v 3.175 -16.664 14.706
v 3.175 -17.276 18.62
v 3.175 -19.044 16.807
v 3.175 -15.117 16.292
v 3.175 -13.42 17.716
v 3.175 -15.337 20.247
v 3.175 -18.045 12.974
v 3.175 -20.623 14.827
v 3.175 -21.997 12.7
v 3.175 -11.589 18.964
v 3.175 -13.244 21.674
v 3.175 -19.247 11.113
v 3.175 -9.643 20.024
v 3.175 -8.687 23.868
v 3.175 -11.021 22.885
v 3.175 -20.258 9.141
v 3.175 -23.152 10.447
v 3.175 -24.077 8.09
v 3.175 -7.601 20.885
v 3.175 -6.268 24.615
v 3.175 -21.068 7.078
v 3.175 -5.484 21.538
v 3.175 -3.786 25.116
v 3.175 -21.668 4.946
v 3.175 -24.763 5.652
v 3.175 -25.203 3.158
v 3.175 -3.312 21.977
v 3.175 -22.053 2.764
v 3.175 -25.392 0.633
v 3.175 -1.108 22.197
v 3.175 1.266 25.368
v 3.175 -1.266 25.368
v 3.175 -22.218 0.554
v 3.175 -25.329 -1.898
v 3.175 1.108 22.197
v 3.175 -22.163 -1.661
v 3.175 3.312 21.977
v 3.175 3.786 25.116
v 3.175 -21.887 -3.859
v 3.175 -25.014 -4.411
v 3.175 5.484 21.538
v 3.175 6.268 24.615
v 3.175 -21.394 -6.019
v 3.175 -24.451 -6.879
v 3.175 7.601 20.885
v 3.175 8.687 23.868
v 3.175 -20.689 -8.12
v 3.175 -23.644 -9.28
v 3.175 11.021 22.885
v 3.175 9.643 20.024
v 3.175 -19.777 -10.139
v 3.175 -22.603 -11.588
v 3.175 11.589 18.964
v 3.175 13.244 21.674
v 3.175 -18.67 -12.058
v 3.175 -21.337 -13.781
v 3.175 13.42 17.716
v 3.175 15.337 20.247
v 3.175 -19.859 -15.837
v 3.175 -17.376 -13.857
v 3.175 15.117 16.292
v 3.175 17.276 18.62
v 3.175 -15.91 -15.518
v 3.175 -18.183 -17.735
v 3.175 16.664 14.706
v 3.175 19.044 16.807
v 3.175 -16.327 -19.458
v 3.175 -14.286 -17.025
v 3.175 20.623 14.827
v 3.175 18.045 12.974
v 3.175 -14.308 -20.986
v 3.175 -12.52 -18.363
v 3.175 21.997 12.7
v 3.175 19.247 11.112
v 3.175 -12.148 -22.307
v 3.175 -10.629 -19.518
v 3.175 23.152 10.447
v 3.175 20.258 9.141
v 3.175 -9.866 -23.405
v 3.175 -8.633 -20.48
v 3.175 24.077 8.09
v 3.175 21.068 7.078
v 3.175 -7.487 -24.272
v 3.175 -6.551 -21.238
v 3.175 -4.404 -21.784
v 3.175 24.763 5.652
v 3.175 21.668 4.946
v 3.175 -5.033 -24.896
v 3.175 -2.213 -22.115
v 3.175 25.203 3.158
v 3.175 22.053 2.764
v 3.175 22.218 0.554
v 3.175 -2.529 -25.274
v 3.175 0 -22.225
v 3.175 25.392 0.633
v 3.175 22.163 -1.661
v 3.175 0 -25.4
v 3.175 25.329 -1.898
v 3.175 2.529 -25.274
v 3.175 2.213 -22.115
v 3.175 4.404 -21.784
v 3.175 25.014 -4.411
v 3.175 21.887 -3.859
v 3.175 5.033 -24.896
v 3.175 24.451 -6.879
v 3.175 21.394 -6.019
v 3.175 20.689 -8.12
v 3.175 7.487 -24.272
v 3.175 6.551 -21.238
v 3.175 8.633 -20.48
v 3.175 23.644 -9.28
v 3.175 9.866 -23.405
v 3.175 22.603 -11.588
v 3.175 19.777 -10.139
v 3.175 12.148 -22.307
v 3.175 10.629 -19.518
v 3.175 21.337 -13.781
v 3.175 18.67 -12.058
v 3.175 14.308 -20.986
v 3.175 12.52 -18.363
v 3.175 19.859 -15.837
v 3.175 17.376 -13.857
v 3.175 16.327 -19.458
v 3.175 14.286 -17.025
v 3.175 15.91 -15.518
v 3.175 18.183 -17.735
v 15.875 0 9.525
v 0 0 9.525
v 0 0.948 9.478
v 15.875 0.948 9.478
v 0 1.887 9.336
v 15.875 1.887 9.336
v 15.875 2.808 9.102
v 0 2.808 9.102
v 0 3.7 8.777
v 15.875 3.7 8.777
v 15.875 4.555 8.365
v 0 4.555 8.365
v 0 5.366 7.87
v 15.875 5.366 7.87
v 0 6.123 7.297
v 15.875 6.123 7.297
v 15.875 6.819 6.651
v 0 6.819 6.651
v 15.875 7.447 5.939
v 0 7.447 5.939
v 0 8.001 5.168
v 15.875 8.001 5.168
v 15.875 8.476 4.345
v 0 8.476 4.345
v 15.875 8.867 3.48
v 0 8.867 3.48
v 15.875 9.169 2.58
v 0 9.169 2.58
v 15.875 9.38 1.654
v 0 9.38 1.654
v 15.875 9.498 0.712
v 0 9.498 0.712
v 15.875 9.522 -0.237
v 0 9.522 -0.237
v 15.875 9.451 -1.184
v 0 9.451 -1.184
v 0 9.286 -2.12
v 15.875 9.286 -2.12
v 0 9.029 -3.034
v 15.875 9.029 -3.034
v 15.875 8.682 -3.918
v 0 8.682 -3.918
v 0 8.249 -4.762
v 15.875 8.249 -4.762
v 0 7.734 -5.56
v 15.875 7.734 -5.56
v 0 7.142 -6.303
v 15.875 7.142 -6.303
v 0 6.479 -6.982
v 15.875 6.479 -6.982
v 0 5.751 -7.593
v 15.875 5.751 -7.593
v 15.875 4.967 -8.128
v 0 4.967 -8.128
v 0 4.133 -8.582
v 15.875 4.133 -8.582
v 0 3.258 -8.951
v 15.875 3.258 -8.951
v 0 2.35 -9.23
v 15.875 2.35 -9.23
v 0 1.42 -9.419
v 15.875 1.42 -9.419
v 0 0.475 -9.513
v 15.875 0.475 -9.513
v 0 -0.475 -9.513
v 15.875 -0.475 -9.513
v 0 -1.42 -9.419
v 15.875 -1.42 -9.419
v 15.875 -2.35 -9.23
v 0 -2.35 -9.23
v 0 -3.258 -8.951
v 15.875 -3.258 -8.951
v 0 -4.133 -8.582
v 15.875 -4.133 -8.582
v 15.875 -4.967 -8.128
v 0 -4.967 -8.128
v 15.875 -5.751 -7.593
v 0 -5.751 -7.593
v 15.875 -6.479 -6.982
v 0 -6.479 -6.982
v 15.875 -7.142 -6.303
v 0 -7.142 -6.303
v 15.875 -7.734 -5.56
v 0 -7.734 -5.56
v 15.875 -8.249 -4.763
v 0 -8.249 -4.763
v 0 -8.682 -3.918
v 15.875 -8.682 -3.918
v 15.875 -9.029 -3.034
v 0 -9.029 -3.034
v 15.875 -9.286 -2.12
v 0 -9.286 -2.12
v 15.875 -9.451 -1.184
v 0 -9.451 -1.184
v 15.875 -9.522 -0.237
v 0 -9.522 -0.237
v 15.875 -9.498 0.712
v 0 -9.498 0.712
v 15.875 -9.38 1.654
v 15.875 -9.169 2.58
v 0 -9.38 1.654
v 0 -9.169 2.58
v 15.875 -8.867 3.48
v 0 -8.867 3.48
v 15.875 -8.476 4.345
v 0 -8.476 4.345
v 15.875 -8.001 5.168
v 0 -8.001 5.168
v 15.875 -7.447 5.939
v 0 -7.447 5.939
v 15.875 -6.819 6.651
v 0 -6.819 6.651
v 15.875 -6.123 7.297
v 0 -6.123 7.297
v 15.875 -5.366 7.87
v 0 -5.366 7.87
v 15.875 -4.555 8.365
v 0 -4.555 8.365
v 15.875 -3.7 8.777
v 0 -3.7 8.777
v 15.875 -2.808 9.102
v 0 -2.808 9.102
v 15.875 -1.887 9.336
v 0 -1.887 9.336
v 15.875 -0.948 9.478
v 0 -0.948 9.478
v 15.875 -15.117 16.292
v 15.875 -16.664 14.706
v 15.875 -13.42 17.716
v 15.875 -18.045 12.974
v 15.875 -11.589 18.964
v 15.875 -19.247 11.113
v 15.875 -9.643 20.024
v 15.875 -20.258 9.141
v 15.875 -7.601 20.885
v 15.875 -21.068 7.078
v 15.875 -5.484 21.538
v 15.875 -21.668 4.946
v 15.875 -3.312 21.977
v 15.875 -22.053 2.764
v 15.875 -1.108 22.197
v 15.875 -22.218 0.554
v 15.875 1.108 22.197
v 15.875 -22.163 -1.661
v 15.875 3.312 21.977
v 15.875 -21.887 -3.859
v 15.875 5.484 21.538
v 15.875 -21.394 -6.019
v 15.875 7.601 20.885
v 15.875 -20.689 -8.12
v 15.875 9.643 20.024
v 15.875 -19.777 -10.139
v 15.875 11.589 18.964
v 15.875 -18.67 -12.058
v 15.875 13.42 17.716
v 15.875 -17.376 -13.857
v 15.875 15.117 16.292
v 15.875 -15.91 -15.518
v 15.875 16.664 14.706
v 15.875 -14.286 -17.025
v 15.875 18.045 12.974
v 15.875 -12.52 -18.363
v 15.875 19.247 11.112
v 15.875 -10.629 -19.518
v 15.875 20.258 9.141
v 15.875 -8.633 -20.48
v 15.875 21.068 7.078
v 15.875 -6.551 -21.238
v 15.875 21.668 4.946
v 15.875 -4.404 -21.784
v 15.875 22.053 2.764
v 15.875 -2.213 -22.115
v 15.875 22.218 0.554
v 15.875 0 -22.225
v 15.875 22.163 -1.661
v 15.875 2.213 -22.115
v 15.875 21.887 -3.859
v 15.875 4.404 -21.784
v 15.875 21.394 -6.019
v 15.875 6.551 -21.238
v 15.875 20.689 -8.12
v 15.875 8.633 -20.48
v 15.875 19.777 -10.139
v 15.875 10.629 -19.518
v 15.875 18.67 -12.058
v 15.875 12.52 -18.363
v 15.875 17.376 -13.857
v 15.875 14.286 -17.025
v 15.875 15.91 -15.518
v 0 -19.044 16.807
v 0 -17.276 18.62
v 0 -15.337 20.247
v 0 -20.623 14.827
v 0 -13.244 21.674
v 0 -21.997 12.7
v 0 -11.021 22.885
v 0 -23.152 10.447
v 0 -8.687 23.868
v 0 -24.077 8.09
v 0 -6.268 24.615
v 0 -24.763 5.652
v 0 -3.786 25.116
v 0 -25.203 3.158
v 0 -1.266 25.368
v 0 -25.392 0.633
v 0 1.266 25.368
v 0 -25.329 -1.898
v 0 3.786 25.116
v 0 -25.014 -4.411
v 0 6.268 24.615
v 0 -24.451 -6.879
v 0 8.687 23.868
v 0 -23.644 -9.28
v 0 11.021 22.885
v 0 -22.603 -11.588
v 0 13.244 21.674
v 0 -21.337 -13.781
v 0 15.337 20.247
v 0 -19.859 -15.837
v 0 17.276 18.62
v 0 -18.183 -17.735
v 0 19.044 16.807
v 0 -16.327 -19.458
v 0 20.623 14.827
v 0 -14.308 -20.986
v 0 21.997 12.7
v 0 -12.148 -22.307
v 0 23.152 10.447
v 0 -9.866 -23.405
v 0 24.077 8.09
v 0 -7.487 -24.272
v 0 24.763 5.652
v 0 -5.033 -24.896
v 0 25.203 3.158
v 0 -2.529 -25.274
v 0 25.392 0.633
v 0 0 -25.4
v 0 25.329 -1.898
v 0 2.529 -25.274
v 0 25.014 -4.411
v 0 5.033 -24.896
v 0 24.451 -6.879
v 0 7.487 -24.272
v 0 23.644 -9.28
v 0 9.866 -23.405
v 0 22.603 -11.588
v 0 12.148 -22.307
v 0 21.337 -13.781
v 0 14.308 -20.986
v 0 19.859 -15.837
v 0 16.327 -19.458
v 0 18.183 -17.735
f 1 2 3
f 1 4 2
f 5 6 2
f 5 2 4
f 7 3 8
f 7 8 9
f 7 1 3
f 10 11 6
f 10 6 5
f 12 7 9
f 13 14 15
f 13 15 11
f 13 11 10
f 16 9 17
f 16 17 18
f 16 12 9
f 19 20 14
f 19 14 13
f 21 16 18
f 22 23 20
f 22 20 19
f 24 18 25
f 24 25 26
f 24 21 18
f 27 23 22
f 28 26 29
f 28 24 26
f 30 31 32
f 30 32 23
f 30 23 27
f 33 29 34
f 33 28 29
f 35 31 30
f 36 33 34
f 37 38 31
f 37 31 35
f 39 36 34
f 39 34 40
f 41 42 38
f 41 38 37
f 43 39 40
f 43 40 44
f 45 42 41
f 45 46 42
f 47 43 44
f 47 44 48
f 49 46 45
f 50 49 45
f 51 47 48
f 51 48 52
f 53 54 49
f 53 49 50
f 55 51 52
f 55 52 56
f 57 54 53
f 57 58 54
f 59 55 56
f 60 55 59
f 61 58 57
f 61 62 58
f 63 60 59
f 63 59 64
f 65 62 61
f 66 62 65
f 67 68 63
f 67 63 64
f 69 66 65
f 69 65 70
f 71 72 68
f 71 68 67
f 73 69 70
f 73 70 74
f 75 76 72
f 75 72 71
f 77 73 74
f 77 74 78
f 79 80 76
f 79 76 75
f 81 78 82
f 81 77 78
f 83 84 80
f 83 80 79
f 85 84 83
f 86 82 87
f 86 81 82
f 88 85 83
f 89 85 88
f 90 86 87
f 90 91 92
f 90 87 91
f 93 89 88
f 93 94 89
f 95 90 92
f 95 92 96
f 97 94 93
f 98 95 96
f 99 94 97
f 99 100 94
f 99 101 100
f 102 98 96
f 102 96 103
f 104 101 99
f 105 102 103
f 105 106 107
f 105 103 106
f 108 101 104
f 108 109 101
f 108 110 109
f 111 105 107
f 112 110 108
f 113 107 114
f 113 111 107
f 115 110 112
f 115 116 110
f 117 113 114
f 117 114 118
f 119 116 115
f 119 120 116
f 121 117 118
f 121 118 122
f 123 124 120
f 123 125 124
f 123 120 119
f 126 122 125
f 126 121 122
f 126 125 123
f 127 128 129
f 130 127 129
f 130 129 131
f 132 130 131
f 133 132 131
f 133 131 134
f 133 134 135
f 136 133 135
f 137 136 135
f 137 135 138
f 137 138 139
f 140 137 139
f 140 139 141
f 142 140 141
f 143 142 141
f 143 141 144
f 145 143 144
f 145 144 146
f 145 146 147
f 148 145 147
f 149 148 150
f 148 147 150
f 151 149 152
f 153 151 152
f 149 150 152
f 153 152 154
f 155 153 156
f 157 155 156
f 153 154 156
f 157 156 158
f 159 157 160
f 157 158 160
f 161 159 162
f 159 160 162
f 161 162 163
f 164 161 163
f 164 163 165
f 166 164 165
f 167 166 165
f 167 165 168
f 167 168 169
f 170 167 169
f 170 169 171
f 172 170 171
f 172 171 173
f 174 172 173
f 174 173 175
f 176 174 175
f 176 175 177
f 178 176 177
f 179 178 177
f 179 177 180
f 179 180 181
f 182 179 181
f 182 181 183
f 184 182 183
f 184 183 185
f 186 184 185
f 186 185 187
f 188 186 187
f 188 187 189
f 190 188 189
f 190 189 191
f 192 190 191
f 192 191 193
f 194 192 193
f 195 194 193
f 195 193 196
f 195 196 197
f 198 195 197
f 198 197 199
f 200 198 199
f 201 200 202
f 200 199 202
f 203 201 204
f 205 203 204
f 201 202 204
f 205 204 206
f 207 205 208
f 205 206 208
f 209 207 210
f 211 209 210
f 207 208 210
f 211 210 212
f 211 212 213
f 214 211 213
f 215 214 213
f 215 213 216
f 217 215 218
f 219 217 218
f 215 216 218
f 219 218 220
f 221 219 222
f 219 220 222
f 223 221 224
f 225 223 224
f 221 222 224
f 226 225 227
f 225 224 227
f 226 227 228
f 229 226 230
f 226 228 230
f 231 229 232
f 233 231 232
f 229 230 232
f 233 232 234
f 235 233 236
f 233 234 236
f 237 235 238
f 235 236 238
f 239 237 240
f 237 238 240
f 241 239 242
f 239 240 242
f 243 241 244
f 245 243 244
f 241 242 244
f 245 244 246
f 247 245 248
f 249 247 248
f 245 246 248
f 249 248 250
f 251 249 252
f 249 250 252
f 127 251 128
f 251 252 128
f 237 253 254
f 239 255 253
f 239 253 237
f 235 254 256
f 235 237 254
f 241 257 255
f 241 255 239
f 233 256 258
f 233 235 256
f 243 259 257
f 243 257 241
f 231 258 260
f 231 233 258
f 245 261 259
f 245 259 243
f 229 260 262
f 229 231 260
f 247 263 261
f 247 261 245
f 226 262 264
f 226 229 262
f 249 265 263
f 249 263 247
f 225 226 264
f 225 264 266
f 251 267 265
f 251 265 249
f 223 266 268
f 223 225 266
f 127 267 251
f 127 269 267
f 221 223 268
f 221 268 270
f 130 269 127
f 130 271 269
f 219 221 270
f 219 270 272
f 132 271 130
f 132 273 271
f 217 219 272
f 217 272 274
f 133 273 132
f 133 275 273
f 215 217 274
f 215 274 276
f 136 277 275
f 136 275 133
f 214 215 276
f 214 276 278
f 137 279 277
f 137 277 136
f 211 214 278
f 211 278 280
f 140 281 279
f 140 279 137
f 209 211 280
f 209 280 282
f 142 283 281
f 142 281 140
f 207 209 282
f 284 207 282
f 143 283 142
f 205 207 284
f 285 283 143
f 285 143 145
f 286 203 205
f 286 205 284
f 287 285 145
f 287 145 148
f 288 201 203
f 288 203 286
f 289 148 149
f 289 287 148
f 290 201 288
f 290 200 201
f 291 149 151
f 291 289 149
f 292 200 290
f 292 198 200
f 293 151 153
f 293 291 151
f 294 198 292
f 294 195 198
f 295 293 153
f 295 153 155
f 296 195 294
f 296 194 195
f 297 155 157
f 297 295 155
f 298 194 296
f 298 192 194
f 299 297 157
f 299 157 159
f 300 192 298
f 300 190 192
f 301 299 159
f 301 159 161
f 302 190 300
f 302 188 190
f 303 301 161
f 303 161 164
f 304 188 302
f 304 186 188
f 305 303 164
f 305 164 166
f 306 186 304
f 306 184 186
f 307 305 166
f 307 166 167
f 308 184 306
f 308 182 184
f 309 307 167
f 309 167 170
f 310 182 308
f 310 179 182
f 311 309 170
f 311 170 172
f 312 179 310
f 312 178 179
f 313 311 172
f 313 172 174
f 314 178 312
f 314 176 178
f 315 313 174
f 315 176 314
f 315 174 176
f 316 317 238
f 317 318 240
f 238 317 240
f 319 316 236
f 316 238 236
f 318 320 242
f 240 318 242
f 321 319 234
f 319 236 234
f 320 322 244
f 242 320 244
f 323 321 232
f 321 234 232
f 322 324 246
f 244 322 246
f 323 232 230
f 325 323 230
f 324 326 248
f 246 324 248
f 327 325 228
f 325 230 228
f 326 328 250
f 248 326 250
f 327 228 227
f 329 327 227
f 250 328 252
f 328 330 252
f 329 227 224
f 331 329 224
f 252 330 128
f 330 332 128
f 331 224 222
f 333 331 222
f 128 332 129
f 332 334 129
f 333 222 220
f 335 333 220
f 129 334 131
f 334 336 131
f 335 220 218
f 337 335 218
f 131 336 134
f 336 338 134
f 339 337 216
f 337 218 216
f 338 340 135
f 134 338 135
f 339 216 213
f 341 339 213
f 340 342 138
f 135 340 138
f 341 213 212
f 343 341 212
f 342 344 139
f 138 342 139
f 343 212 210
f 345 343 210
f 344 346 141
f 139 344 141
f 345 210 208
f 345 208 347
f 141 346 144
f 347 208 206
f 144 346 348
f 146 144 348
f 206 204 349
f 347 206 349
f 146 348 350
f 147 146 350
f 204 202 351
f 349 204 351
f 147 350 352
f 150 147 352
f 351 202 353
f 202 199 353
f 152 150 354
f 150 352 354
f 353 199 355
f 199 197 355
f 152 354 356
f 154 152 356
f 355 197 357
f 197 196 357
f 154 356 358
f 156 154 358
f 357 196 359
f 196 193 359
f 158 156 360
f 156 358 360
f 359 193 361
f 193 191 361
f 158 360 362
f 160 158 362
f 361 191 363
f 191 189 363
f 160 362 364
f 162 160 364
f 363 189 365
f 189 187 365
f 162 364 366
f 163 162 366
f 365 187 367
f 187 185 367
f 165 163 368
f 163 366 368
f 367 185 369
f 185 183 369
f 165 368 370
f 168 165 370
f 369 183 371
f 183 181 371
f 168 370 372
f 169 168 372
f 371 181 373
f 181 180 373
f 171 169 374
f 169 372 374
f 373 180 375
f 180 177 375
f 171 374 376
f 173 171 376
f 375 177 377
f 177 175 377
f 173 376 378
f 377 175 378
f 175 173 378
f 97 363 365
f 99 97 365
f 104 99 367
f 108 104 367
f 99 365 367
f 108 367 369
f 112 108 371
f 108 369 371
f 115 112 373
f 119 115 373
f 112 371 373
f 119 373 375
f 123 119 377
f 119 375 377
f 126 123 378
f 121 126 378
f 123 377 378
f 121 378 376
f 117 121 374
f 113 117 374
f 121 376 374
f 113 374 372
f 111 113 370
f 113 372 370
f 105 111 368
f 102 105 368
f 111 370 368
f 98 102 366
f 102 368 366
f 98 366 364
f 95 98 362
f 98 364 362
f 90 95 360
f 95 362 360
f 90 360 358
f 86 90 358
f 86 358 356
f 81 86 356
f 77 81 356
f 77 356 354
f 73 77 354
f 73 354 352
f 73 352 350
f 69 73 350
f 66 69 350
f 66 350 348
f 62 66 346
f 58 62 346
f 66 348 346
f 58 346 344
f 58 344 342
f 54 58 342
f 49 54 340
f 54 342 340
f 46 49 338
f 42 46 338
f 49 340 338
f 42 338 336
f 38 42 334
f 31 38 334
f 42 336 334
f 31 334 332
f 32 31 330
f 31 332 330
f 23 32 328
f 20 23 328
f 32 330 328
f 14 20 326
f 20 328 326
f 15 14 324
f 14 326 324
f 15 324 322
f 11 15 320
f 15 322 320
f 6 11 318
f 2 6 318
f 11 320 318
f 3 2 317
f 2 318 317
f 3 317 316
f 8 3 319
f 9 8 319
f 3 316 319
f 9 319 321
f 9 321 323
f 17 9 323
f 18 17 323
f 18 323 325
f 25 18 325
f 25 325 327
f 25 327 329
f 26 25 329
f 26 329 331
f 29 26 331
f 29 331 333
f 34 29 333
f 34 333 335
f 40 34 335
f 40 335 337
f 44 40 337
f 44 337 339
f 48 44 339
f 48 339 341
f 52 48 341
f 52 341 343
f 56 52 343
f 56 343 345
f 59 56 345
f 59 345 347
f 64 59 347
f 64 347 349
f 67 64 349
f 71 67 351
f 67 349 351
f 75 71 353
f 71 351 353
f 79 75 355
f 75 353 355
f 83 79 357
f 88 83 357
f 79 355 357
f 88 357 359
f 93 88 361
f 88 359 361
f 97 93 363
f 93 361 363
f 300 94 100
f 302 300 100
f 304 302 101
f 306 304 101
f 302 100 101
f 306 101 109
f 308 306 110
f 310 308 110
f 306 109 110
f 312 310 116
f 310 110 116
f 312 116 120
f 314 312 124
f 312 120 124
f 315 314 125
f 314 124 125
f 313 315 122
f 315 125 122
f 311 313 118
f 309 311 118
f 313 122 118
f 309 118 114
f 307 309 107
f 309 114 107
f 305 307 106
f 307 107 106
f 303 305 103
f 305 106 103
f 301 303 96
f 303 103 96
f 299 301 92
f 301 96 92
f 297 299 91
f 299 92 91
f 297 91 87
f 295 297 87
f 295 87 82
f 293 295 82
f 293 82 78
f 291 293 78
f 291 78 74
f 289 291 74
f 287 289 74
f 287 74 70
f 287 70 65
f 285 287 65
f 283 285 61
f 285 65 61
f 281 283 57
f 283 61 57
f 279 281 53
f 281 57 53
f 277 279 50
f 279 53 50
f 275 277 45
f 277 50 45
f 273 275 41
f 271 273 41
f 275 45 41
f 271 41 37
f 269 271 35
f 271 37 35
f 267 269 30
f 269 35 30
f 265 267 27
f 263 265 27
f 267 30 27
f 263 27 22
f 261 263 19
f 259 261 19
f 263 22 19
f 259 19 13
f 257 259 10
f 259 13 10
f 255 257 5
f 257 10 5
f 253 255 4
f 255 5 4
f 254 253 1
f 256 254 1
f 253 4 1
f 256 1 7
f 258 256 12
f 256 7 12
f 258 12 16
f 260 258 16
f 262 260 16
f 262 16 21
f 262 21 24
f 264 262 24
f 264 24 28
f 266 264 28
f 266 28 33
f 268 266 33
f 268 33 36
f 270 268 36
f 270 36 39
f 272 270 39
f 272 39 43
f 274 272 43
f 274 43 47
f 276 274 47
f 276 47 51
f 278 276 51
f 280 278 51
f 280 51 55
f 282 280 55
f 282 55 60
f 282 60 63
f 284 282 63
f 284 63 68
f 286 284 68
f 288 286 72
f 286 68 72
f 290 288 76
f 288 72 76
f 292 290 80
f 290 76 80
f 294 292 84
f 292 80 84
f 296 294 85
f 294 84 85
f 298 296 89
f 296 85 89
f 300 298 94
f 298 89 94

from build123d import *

# Parameters (mm, degrees)
SKETCH1_R           = 25.4
BOSS_EXTRUDE1_DEPTH = 3.175
SKETCH2_R           = 22.225
BOSS_EXTRUDE2_DEPTH = 12.7
SKETCH3_R           = 9.525
CUT_EXTRUDE1_DEPTH  = 16.875


with BuildPart() as part:
    # Sketch1 → Boss-Extrude1 (new body)
    with BuildSketch(Plane(origin=(0, 0, 0), x_dir=(0, 0, -1), z_dir=(1, 0, 0))):
        Circle(SKETCH1_R)
    extrude(amount=BOSS_EXTRUDE1_DEPTH)

    # Sketch2 → Boss-Extrude2 (add)
    with BuildSketch(Plane(origin=(3.175, 0, 0), x_dir=(0, 0, -1), z_dir=(1, 0, 0))):
        Circle(SKETCH2_R)
    extrude(amount=BOSS_EXTRUDE2_DEPTH)

    # Sketch3 → Cut-Extrude1 (cut, through all)
    with BuildSketch(Plane.ZY):
        Circle(SKETCH3_R)
    extrude(amount=-CUT_EXTRUDE1_DEPTH, mode=Mode.SUBTRACT)


solid = part.part
